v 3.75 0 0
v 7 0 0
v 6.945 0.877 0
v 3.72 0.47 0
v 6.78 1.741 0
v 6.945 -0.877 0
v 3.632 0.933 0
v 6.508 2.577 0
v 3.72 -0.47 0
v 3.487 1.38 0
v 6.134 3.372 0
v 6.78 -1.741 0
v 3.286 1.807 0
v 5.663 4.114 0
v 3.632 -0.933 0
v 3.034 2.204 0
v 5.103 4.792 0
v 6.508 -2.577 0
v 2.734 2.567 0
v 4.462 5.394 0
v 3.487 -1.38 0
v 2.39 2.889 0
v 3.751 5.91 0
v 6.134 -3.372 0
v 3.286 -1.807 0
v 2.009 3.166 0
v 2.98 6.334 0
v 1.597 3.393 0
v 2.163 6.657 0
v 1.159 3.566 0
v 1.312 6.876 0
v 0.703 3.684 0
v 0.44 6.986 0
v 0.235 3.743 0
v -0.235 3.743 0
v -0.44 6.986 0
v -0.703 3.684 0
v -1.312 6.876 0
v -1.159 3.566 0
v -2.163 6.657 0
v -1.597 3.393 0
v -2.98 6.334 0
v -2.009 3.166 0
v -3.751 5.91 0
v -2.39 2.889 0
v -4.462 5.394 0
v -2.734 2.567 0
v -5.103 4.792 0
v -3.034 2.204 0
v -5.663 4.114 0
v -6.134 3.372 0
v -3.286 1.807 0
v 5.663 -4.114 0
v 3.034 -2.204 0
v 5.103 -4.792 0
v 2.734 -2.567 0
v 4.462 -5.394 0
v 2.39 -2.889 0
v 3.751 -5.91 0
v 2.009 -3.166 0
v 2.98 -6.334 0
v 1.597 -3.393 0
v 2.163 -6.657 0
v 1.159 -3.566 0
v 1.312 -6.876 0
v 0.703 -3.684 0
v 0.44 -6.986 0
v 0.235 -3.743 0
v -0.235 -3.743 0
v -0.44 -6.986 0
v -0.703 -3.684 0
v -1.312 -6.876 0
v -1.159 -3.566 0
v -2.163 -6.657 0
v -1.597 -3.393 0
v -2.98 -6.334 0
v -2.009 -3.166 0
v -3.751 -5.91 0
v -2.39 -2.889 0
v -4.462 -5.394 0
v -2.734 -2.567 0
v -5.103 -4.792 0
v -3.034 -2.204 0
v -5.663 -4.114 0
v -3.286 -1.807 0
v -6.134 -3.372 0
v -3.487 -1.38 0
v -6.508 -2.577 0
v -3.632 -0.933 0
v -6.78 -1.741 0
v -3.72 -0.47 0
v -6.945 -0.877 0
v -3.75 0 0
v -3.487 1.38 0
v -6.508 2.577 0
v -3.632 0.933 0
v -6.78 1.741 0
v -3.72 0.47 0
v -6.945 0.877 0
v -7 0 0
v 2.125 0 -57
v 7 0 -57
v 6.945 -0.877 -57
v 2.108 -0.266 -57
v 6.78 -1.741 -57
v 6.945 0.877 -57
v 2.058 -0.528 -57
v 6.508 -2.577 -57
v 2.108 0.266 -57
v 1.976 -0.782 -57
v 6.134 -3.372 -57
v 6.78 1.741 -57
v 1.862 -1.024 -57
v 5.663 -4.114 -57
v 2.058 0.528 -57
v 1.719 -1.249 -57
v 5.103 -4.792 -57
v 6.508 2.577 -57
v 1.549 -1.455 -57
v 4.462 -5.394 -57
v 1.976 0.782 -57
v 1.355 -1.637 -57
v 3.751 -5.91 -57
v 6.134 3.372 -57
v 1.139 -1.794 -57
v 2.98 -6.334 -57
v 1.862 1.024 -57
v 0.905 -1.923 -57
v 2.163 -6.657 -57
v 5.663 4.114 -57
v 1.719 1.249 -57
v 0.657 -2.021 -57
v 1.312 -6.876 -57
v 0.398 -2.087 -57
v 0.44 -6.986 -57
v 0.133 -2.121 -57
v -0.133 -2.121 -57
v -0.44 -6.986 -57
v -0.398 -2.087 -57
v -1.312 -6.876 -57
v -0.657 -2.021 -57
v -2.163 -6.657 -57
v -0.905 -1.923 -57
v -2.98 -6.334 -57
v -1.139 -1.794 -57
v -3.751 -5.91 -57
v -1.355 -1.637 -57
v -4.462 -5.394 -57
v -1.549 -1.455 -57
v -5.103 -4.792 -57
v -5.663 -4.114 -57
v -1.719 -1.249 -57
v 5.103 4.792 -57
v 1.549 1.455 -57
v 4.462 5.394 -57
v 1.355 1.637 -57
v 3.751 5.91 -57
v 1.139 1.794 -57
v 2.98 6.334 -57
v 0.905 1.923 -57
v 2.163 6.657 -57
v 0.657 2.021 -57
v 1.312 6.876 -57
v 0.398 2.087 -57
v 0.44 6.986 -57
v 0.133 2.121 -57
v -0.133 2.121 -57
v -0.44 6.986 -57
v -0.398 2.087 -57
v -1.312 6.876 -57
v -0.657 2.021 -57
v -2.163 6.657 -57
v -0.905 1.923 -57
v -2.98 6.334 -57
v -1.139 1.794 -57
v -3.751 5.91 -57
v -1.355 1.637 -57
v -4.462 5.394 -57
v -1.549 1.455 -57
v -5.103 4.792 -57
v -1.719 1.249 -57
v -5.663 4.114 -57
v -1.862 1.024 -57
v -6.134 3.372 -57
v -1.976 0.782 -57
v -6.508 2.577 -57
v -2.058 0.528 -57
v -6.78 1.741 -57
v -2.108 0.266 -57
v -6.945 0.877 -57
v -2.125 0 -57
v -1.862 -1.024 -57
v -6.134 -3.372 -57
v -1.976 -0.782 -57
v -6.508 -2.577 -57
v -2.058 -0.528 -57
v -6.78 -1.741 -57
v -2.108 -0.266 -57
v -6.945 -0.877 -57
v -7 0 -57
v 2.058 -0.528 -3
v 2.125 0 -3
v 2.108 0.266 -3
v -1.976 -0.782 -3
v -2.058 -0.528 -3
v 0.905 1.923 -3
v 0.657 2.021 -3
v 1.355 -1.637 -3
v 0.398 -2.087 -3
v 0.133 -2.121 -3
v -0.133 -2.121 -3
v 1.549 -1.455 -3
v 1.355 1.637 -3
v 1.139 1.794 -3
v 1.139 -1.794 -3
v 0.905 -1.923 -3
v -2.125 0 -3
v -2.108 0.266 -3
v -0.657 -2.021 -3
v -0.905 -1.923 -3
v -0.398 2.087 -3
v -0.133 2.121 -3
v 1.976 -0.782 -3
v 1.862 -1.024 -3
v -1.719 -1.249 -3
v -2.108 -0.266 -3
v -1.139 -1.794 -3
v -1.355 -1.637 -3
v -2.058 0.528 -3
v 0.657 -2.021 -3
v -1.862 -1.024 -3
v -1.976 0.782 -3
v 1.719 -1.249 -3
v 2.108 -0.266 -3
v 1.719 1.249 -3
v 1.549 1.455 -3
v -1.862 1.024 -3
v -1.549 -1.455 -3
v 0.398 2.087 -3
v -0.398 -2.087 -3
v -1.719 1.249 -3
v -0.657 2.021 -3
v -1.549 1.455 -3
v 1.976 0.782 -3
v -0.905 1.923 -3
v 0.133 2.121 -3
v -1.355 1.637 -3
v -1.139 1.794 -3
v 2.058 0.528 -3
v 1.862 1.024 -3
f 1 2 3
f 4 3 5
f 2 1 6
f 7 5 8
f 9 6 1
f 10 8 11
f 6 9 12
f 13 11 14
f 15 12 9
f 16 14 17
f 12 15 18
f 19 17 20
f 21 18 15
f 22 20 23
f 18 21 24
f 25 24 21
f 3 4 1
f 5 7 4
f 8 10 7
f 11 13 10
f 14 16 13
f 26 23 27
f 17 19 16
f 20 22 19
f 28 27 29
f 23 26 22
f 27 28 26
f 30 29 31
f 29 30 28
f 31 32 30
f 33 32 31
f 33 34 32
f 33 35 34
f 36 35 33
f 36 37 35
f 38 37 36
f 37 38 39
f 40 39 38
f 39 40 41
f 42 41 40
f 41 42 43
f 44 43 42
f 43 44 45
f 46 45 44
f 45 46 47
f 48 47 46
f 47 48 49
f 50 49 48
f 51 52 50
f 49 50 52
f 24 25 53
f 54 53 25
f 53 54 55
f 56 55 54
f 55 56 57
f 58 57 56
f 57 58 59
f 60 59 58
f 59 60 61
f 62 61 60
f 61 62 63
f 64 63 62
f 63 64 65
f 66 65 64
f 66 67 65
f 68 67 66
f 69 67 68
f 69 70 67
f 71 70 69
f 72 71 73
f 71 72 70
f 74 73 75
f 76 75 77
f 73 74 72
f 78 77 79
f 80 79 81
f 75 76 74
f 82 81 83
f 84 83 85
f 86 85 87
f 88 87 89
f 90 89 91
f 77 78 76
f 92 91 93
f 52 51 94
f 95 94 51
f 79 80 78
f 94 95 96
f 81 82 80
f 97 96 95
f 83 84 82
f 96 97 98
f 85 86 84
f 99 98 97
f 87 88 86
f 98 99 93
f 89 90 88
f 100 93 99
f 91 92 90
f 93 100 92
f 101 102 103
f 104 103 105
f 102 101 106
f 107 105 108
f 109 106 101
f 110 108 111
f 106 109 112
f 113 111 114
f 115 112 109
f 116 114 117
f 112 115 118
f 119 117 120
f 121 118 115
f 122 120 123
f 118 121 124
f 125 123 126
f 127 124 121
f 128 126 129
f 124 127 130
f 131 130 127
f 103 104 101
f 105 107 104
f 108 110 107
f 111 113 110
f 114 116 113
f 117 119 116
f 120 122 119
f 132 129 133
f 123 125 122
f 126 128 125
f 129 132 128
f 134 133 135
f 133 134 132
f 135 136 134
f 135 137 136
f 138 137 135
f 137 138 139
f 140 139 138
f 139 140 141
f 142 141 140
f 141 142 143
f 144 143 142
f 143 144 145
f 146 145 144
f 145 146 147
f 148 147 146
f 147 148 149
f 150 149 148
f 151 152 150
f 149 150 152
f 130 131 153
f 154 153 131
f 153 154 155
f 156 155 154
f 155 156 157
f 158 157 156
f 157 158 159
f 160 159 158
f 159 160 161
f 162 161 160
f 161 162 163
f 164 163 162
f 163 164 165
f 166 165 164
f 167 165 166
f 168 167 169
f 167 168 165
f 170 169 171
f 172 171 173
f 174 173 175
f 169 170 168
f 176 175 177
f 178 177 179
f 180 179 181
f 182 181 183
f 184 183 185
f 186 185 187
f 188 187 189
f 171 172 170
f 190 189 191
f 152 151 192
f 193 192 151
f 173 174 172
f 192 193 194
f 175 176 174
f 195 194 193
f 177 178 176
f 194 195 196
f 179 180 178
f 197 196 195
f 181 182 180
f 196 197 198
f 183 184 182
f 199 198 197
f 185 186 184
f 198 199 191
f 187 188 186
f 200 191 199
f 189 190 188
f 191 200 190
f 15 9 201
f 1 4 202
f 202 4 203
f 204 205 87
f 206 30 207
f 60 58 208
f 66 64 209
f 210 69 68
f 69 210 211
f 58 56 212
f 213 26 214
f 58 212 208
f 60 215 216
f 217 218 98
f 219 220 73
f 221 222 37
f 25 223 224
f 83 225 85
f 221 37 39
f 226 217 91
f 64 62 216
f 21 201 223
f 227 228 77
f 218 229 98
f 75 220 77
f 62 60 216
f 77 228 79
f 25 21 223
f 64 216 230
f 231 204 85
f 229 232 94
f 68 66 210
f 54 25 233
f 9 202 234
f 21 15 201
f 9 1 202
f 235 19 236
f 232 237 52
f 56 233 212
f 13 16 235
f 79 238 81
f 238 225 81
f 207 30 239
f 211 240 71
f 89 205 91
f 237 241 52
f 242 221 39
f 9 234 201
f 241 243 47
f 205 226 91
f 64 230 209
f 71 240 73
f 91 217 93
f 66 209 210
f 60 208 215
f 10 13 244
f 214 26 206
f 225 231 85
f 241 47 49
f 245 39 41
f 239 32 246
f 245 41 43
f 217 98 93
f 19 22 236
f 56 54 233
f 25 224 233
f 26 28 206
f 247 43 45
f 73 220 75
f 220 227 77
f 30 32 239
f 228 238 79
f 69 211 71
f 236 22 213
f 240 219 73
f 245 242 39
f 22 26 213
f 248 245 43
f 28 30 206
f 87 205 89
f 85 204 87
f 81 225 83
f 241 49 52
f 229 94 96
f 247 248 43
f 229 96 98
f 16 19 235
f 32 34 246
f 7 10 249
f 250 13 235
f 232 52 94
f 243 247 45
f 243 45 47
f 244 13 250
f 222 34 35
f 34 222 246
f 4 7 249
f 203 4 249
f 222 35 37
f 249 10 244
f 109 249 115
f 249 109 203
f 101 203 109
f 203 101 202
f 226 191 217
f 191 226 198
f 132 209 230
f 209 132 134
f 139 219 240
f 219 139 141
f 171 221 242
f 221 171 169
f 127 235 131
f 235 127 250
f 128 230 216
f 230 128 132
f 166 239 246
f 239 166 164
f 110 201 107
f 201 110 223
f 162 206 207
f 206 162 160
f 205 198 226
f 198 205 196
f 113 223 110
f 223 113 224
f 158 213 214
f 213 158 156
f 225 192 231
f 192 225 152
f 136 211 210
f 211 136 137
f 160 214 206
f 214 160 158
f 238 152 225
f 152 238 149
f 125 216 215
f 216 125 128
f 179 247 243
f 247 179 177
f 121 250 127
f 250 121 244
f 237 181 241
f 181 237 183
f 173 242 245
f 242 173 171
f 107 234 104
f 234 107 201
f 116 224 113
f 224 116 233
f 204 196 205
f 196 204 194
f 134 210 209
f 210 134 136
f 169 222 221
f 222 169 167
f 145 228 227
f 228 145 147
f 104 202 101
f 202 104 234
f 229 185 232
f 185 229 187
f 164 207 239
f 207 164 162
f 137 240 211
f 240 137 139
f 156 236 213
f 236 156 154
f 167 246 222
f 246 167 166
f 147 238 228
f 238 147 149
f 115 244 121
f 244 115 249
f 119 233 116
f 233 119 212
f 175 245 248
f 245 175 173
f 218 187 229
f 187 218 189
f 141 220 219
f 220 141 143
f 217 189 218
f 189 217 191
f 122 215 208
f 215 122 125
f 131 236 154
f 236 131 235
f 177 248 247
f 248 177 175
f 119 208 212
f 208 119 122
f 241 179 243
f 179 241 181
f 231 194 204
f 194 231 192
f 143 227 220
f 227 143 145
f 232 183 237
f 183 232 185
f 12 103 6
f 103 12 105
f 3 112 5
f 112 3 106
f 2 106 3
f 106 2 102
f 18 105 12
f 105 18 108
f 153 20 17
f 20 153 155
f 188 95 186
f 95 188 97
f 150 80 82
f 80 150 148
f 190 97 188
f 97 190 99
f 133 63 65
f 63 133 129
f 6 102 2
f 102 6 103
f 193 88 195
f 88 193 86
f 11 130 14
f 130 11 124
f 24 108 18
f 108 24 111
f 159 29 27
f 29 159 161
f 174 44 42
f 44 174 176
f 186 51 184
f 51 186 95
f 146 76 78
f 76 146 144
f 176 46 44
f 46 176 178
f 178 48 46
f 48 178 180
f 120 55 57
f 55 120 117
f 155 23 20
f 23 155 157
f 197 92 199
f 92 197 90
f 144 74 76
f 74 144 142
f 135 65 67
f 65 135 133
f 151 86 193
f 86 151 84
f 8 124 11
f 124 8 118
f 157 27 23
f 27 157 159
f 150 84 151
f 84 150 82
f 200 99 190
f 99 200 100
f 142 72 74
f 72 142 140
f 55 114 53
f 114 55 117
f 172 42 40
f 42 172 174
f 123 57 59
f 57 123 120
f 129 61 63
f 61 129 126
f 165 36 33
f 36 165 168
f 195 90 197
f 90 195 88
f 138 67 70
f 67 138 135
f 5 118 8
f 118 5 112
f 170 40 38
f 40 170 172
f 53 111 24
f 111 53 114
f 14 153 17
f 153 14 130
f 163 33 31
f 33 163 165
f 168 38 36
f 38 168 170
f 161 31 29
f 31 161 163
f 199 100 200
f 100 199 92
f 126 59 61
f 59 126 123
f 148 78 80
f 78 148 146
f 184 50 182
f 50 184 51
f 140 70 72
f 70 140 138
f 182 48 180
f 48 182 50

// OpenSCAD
$fn = 50;


difference() {
	union() {
		translate(v = [0, 0, -57.0000000000]) {
			cylinder(h = 57, r = 7.0000000000);
		}
		cylinder(h = 0, r = 10.0000000000);
	}
	union() {
		translate(v = [0, 0, 0]) {
			rotate(a = [0, 0, 0]) {
				difference() {
					union() {
						#translate(v = [0, 0, -57.0000000000]) {
							cylinder(h = 57, r = 2.0000000000);
						}
						#translate(v = [0, 0, -3]) {
							cylinder(h = 3, r = 7.0000000000, r1 = 2.1250000000, r2 = 3.7500000000);
						}
						#translate(v = [0, 0, -57.0000000000]) {
							cylinder(h = 57, r = 2.1250000000);
						}
						#translate(v = [0, 0, -57.0000000000]) {
							cylinder(h = 57, r = 2.0000000000);
						}
					}
					union();
				}
			}
		}
	}
}
